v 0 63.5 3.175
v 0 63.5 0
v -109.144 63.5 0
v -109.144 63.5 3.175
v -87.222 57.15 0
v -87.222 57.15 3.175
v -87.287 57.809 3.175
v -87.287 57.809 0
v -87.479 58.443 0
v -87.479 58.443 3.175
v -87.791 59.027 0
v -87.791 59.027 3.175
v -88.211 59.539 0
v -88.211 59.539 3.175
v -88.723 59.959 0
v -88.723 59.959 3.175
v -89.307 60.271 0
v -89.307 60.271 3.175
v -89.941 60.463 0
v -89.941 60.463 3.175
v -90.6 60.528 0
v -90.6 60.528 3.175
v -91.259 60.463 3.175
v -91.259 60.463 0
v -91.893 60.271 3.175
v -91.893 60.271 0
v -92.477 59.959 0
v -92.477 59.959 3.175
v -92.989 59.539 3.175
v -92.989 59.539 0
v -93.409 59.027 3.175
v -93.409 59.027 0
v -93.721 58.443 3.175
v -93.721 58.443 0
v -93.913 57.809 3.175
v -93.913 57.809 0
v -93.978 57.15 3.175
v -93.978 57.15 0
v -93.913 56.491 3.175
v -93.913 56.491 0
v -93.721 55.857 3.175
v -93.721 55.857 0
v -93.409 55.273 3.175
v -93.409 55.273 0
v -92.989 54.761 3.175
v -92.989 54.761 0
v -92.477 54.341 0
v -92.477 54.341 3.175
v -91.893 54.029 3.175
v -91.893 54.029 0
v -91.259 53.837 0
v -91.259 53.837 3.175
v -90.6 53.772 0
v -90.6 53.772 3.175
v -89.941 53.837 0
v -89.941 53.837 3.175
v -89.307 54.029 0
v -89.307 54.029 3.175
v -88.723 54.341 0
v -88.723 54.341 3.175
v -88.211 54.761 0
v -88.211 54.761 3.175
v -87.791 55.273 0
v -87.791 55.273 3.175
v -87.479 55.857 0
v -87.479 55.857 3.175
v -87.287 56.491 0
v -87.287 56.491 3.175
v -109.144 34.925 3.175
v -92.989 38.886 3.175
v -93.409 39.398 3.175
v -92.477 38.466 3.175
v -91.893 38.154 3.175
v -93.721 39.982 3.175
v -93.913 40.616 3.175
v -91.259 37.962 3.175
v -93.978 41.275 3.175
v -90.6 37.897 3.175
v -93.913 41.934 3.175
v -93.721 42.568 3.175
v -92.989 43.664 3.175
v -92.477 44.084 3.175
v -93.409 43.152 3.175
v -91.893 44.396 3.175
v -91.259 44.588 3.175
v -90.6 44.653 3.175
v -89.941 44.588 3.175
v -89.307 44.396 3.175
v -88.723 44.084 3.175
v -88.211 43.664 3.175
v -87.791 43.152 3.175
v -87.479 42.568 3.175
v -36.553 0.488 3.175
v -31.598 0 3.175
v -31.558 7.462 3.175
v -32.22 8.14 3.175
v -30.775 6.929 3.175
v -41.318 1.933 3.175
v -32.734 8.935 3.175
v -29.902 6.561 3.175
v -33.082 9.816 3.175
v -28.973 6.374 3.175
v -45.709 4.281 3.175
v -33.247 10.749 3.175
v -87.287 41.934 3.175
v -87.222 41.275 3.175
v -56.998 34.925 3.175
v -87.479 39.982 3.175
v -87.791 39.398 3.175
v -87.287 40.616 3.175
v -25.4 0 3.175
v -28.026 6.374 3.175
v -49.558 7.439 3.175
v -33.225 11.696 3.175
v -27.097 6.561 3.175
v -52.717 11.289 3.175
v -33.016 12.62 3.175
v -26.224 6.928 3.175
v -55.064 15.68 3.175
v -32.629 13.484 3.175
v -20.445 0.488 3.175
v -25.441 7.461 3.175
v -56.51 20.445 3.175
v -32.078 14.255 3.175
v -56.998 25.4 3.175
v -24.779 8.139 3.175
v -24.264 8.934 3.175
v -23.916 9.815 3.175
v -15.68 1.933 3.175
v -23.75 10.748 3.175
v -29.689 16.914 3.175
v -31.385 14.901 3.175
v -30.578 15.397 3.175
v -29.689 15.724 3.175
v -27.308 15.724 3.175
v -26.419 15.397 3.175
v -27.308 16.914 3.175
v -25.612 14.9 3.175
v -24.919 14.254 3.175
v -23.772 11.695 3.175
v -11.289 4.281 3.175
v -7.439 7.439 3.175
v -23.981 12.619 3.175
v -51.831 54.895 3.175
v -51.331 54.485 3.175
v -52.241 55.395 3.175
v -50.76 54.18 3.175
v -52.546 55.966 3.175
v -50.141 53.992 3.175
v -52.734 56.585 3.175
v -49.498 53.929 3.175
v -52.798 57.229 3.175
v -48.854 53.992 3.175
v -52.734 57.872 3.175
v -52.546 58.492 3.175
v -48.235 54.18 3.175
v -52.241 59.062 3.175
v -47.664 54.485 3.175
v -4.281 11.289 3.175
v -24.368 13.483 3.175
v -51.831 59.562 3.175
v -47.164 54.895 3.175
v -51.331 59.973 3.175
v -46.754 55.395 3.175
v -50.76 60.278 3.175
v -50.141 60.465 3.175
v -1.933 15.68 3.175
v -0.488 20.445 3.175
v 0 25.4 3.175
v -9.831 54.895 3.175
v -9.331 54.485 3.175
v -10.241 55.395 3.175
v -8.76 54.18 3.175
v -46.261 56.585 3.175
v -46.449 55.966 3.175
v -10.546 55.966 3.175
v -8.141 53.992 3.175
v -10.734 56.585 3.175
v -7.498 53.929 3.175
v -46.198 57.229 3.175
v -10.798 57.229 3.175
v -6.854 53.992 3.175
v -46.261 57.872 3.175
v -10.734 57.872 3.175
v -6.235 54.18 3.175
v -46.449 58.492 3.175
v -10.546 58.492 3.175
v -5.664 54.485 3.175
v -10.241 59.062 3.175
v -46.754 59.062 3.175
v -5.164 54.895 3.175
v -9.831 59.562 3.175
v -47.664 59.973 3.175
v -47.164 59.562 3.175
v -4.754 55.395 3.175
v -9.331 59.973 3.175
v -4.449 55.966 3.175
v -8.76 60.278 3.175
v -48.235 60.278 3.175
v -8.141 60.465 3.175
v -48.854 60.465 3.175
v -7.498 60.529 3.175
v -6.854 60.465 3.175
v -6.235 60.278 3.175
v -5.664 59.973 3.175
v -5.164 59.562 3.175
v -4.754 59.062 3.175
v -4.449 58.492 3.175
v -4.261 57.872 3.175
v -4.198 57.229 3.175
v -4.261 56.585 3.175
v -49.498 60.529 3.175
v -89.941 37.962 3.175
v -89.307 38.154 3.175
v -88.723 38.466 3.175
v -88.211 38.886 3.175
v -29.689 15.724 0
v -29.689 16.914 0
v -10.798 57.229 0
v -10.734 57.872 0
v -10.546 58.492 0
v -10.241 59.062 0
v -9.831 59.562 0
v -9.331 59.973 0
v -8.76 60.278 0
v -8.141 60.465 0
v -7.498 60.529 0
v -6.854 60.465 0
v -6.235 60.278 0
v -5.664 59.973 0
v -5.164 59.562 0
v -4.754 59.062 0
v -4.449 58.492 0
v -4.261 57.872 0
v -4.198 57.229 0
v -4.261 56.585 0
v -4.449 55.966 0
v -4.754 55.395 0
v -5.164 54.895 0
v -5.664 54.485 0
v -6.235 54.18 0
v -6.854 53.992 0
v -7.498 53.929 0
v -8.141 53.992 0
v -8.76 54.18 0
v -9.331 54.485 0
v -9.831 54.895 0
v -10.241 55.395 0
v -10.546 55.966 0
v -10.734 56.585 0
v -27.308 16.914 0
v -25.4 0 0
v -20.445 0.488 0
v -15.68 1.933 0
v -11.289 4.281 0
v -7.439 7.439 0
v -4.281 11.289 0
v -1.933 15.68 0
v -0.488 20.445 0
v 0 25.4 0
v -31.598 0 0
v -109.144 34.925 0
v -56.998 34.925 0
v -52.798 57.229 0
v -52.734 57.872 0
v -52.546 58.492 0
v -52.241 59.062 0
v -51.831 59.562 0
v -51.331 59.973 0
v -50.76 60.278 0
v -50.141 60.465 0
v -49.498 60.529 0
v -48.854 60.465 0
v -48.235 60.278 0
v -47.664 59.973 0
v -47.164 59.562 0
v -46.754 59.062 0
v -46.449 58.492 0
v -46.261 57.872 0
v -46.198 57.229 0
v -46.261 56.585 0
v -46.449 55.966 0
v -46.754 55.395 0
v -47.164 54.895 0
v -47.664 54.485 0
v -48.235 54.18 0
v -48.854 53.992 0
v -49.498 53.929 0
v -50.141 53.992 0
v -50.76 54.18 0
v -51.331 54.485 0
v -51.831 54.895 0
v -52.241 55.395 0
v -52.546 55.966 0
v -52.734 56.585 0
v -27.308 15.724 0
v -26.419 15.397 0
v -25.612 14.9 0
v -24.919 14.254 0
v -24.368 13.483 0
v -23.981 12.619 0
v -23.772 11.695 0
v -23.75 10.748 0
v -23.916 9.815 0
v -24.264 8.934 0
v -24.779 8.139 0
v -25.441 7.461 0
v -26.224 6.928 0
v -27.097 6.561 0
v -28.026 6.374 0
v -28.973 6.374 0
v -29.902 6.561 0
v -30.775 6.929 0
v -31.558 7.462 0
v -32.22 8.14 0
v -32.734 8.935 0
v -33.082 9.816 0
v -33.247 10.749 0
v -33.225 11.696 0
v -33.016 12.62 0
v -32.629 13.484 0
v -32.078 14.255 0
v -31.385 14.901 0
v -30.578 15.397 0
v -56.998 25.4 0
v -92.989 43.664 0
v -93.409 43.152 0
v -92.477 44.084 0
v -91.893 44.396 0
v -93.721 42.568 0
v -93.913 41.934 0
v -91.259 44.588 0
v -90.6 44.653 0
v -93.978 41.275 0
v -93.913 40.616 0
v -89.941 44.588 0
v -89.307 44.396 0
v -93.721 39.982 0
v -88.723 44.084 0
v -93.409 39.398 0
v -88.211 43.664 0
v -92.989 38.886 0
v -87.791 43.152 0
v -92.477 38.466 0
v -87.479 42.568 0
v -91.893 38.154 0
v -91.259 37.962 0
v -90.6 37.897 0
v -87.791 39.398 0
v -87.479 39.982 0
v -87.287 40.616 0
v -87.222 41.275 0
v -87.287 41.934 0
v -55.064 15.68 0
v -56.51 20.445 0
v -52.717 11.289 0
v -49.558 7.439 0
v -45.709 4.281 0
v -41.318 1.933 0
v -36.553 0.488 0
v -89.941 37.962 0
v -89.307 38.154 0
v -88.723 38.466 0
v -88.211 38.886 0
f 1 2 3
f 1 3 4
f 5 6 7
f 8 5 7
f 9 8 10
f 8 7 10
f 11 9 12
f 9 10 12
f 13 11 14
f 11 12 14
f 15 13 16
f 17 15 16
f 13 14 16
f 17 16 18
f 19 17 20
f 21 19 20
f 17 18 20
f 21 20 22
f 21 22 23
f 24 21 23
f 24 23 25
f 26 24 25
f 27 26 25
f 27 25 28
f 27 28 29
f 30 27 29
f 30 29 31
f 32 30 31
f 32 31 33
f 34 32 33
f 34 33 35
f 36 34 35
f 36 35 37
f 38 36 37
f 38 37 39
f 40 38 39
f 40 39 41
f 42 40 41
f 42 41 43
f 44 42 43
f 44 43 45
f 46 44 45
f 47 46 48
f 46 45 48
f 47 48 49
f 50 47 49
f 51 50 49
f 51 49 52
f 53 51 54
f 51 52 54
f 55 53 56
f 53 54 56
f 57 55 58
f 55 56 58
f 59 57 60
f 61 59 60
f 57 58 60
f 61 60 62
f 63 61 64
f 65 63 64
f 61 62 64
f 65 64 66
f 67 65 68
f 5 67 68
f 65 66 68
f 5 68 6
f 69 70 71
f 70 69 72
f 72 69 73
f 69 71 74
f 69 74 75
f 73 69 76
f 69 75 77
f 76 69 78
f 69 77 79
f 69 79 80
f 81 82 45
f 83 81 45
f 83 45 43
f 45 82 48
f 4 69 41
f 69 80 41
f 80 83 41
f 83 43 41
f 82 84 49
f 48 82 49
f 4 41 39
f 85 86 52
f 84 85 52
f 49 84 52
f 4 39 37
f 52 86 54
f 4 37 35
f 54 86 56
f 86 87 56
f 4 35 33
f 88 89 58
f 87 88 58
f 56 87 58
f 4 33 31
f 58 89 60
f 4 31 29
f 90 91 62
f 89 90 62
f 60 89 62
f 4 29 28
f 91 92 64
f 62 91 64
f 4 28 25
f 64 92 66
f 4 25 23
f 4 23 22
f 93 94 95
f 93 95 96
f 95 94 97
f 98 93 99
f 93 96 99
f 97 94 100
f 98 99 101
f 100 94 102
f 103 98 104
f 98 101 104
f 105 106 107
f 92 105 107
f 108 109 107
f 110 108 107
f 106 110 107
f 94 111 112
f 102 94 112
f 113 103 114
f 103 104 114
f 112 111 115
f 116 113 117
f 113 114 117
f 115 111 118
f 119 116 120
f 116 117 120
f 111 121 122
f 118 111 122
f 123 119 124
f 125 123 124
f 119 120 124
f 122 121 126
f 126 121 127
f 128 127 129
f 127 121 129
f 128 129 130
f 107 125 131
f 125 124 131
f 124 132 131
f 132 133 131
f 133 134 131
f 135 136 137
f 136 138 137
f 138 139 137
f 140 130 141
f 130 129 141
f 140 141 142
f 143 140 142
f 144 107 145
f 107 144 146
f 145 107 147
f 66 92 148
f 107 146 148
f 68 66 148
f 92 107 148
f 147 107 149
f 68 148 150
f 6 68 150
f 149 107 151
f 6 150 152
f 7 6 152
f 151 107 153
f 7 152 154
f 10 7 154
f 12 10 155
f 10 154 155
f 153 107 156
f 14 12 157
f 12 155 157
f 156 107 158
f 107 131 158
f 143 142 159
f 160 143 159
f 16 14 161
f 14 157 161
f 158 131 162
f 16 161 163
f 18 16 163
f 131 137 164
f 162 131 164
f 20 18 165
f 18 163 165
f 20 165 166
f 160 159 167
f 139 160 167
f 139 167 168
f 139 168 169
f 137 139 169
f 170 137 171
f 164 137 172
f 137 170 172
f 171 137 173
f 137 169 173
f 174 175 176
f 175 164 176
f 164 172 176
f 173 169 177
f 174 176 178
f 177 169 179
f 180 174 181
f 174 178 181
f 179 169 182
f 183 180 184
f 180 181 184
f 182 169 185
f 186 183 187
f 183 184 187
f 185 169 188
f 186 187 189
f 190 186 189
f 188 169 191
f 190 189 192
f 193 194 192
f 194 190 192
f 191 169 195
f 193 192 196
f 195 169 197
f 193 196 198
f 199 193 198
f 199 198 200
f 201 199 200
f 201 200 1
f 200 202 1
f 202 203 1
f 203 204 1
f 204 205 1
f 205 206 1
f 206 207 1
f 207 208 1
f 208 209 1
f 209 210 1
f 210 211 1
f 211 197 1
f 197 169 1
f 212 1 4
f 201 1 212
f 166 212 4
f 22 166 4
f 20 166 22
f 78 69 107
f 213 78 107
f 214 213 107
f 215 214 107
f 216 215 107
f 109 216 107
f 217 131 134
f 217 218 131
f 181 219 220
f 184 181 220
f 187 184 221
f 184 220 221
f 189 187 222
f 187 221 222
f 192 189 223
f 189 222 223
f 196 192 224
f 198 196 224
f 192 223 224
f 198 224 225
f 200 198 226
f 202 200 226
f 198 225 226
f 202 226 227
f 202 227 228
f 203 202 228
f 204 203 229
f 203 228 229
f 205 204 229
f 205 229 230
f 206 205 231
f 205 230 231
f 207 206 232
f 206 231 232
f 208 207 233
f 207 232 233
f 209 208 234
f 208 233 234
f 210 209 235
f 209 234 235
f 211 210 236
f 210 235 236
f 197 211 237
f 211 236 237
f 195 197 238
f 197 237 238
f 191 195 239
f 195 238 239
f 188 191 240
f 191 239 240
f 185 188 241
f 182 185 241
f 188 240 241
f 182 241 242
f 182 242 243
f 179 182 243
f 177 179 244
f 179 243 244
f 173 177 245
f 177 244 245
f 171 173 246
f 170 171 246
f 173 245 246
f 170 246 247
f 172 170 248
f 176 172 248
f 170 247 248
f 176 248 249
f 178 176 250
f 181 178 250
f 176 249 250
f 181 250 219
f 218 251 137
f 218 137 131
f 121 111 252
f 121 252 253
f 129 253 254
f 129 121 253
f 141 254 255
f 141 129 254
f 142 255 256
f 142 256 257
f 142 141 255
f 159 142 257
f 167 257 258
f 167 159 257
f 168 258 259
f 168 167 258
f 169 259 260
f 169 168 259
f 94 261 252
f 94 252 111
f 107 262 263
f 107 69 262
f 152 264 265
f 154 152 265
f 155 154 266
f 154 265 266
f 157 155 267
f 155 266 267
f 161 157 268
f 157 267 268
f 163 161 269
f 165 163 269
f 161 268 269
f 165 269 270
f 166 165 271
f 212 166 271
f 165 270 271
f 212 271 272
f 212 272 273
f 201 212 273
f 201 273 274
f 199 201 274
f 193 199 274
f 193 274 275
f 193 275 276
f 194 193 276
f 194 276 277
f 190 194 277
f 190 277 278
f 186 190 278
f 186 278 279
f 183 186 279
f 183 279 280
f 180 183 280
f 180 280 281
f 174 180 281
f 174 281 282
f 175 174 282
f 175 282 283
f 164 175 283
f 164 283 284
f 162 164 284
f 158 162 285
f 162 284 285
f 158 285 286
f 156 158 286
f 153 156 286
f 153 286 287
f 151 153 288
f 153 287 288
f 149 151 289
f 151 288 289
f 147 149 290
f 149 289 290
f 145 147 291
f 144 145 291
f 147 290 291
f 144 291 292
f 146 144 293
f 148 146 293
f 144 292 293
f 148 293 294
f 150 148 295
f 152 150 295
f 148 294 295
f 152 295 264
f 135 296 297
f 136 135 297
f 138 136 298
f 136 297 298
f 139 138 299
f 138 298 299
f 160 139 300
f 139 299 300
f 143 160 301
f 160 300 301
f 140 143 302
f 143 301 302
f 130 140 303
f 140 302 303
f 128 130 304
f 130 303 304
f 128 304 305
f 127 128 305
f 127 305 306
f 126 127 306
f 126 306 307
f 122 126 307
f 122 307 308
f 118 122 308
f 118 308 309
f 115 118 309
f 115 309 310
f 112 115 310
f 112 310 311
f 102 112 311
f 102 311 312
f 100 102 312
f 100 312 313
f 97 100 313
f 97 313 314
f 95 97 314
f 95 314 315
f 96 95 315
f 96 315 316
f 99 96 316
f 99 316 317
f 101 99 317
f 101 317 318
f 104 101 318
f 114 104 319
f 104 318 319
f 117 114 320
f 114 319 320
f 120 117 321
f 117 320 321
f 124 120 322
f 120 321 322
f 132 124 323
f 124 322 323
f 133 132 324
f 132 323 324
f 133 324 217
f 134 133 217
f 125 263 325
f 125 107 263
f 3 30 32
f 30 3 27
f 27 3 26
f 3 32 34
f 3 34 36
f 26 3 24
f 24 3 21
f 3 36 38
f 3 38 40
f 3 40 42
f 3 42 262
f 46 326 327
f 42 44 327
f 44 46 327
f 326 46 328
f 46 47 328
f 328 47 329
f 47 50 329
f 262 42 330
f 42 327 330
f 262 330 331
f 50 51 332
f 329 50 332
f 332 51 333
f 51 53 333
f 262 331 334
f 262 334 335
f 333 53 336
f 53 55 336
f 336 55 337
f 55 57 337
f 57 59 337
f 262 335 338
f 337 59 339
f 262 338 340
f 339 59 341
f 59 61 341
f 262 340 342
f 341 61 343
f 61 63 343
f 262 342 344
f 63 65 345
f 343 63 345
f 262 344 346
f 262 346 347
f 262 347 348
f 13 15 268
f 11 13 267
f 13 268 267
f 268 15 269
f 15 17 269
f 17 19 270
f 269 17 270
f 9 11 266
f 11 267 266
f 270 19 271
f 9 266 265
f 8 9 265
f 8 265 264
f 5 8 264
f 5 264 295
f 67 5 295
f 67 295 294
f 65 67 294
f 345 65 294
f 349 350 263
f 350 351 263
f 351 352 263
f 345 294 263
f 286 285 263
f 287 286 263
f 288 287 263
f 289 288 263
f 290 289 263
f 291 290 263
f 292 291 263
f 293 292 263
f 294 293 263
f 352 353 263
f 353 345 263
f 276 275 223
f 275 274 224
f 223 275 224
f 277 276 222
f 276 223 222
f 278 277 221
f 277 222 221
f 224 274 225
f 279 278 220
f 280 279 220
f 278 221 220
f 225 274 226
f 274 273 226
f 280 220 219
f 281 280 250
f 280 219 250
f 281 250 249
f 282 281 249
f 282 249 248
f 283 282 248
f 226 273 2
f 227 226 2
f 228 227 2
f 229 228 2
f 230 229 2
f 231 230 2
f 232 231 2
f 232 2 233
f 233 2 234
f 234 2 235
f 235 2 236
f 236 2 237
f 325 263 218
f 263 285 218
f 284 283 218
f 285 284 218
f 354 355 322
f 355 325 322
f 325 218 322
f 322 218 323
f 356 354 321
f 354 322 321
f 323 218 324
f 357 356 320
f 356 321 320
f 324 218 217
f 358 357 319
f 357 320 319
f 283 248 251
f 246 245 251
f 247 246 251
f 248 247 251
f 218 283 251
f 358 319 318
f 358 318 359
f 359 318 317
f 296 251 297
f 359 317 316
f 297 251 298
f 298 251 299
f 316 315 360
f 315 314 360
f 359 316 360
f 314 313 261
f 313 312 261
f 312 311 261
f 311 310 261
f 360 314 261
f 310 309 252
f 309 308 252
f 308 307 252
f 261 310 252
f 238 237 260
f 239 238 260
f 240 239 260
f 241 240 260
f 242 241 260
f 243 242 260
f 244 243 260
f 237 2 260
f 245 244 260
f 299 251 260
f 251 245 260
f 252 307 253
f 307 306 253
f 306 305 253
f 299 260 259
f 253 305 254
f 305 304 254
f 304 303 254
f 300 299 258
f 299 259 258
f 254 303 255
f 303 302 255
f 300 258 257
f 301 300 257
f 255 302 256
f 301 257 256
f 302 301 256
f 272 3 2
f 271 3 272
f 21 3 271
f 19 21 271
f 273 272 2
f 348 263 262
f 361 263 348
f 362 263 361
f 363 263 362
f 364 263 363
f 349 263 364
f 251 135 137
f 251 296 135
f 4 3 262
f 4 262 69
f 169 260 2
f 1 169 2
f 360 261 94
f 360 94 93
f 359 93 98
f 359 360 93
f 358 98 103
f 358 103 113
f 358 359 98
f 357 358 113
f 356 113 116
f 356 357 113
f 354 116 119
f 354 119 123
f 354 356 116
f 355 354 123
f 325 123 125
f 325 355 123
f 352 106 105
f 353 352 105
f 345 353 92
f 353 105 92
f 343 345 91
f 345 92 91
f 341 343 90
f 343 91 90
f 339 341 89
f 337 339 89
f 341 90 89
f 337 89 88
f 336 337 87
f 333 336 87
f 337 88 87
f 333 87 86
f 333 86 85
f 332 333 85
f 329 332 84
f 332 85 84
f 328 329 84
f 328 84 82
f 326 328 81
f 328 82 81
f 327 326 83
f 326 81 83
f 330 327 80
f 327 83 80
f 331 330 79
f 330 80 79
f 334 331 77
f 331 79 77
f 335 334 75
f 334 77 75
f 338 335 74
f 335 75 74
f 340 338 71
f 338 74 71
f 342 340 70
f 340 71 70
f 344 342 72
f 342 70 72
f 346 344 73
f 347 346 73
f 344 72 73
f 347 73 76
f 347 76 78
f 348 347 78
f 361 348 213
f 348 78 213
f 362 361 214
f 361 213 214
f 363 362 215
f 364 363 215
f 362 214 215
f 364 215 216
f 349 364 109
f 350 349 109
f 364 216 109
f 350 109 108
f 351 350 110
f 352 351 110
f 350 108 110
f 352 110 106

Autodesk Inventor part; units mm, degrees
ref_plane "YZ Plane" through (0, 0, 0) normal (1, 0, 0) x (0, 1, 0)
ref_plane "XZ Plane" through (0, 0, 0) normal (0, 1, 0) x (-1, 0, 0)
ref_plane "XY Plane" through (0, 0, 0) normal (0, 0, 1) x (1, 0, 0)
sketch "Sketch1" plane through (0, 0, 0) normal (0, 0, 1) x (1, 0, 0)
  line L0 (-56.9976, 63.5) -> (0, 63.5)
  line L1 (0, 63.5) -> (-7.493, 63.5)
  line L2 (-7.493, 63.5) -> (-7.493, 57.15)
  line L3 (-56.9976, 63.5) -> (-49.5046, 63.5)
  line L4 (-49.5046, 63.5) -> (-49.5046, 57.15)
  line L5 (-56.9976, 63.5) -> (-56.9976, 0)
  line L6 (-56.9976, 0) -> (0, 0)
  line L7 (0, 0) -> (0, 63.5)
  line L8 (-28.4988, 0) -> (-28.4988, 11.1125)
  circle A0 centre (-28.4988, 11.1125) radius 4.7625
  dimension "d3" = 7.493
  dimension "d4" = 6.35
  dimension "d5" = 7.493
  dimension "d19" = 6.35
  dimension "d60" = 63.5
  dimension "d61" = 11.1125
  dimension "d62" = 9.525
extrude "Plate6" add sketch "Sketch1" along normal blind 3.175
sketch "Sketch6" plane through (0, 0, 0) normal (0, 0, -1) x (-1, 0, 0)
  line L0 (56.9976, 63.5) -> (56.9976, 0) projected
  line L1 (28.4988, 11.1125) -> (27.3076, 11.1125)
  line L2 (28.4988, 11.1125) -> (29.6894, 11.1125)
  circle A0 centre (28.4988, 11.1125) radius 4.7625
  circle A1 centre (28.4988, 11.1125) radius 4.7625 projected
  line L3 (27.3076, 11.1125) -> (29.6888, 11.1125)
  line L4 (29.6888, 11.1125) -> (29.6888, 15.7239)
  line L5 (29.6888, 15.7239) -> (27.3076, 15.7239)
  line L6 (27.3076, 15.7239) -> (27.3076, 11.1125)
  line L7 (27.3076, 15.7239) -> (27.3076, 16.9145)
  line L8 (27.3076, 16.9145) -> (29.6888, 16.9145)
  line L9 (29.6888, 16.9145) -> (29.6888, 15.7239)
  point P0 (27.2012, 15.6948)
  point P1 (30.5454, 15.4129)
  dimension "d82" = 1.1906
  dimension "d86" = 2.3813
  dimension "d87" = 1.1906
extrude "Cut1" cut sketch "Sketch6" against normal blind 3.175 contours L7 L8 L9 A0 | A0 L5
sketch "Sketch7" plane through (-56.9976, 0, 0) normal (-1, 0, 0) x (0, 0, 1)
  line L0 (3.175, 0) -> (3.175, 63.5) projected
  line L1 (0, 63.5) -> (3.175, 63.5) projected
  line L2 (0, 63.5) -> (0, 0) projected
  line L3 (0, 0) -> (3.175, 0) projected
extrude "Extrusion2" add sketch "Sketch7" along normal blind 52.1462
sketch "Sketch8" plane through (0, 0, 3.175) normal (0, 0, 1) x (1, 0, 0)
  line L0 (0, 0) -> (-109.1438, 0) projected
  line L1 (-109.1438, 0) -> (-109.1438, 63.5) projected
  line L2 (-109.1438, 63.5) -> (-109.1438, 34.925)
  line L3 (-109.1438, 34.925) -> (-56.9976, 34.925)
  line L4 (-56.9976, 34.925) -> (-56.9976, 0)
  circle A0 centre (-75.5412, 57.15) radius 3.3782 projected
  circle A1 centre (-75.5412, 41.275) radius 3.3782 projected
  dimension "d71" = 28.575
  dimension "d72" = 52.1462
sketch "Sketch9" plane through (0, 0, 0) normal (0, 0, -1) x (-1, 0, 0)
  circle A0 centre (49.4976, 57.2287) radius 3.3
  circle A1 centre (7.4976, 57.2287) radius 3.3
extrude "Cut3" cut sketch "Sketch9" against normal blind 3.175
extrude "Cut4" cut sketch "Sketch8" against normal blind 3.175 contours L0 L1 L3 L4
sketch "Sketch10" plane through (0, 0, 3.175) normal (0, 0, 1) x (1, 0, 0)
  circle A0 centre (-90.6002, 57.15) radius 3.3782 projected
  circle A1 centre (-90.6002, 41.275) radius 3.3782 projected
extrude "Cut5" cut sketch "Sketch10" against normal blind 3.175
fillet "Fillet1" radius 25.4 2 edges at (-56.9976, 0, 1.5875) (0, 0, 1.5875)
sketch "Sketch11" plane through (0, 0, 3.175) normal (0, 0, 1) x (1, 0, 0)
  circle A0 centre (-90.6002, 57.15) radius 3.3782 projected
  circle A1 centre (-90.6002, 41.275) radius 3.3782 projected
  arc A2 (-25.4, 0) -> (0, 25.4) centre (-25.4, 25.4) ccw projected
  line L0 (0, 63.5) -> (0, 25.4) projected
  line L1 (-109.1438, 63.5) -> (0, 63.5) projected
  line L2 (-109.1438, 34.925) -> (-109.1438, 63.5) projected
  line L3 (-109.1438, 34.925) -> (-56.9976, 34.925) projected
  line L4 (-56.9976, 34.925) -> (-56.9976, 25.4) projected
  arc A3 (-56.9976, 25.4) -> (-31.5976, 0) centre (-31.5976, 25.4) ccw projected
  line L5 (-25.4, 0) -> (-31.5976, 0) projected
  circle A4 centre (-49.4976, 57.2287) radius 3.3 projected
  circle A5 centre (-7.4976, 57.2287) radius 3.3 projected
  line L6 (-29.6888, 15.7239) -> (-29.6888, 16.9145) projected
  line L7 (-29.6888, 16.9145) -> (-27.3076, 16.9145) projected
  line L8 (-27.3076, 16.9145) -> (-27.3076, 15.7239) projected
  line L9 (-27.3076, 15.7239) -> (-27.3088, 15.7239) projected
  arc A6 (-29.6888, 15.7239) -> (-27.3088, 15.7239) centre (-28.4988, 11.1125) ccw projected
  point P0 (0, 0)
equation "\"d67\" = Thickness"
equation "\"d75\" = Thickness"
equation "\"d77\" = Thickness"
equation "\"d79\" = Thickness"
equation "\"BendRadius\" = Thickness"
equation "\"BendReliefWidth\" = Thickness"
equation "\"BendReliefDepth\" = 0.5 * Thickness"
equation "\"CornerReliefSize\" = 4 * Thickness"
equation "\"MinimumRemnant\" = 2 * Thickness"
equation "\"TransitionRadius\" = BendRadius"
equation "\"JacobiRadiusSize\" = BendRadius"
equation "\"GapSize\" = Thickness"
equation "\"d8\" = BendRadius"
equation "\"d56\" = BendRadius"
equation "\"d63\" = BendRadius"
equation "\"Thickness\" = 3.175"
properties part number "arm mout" material "Steel"
